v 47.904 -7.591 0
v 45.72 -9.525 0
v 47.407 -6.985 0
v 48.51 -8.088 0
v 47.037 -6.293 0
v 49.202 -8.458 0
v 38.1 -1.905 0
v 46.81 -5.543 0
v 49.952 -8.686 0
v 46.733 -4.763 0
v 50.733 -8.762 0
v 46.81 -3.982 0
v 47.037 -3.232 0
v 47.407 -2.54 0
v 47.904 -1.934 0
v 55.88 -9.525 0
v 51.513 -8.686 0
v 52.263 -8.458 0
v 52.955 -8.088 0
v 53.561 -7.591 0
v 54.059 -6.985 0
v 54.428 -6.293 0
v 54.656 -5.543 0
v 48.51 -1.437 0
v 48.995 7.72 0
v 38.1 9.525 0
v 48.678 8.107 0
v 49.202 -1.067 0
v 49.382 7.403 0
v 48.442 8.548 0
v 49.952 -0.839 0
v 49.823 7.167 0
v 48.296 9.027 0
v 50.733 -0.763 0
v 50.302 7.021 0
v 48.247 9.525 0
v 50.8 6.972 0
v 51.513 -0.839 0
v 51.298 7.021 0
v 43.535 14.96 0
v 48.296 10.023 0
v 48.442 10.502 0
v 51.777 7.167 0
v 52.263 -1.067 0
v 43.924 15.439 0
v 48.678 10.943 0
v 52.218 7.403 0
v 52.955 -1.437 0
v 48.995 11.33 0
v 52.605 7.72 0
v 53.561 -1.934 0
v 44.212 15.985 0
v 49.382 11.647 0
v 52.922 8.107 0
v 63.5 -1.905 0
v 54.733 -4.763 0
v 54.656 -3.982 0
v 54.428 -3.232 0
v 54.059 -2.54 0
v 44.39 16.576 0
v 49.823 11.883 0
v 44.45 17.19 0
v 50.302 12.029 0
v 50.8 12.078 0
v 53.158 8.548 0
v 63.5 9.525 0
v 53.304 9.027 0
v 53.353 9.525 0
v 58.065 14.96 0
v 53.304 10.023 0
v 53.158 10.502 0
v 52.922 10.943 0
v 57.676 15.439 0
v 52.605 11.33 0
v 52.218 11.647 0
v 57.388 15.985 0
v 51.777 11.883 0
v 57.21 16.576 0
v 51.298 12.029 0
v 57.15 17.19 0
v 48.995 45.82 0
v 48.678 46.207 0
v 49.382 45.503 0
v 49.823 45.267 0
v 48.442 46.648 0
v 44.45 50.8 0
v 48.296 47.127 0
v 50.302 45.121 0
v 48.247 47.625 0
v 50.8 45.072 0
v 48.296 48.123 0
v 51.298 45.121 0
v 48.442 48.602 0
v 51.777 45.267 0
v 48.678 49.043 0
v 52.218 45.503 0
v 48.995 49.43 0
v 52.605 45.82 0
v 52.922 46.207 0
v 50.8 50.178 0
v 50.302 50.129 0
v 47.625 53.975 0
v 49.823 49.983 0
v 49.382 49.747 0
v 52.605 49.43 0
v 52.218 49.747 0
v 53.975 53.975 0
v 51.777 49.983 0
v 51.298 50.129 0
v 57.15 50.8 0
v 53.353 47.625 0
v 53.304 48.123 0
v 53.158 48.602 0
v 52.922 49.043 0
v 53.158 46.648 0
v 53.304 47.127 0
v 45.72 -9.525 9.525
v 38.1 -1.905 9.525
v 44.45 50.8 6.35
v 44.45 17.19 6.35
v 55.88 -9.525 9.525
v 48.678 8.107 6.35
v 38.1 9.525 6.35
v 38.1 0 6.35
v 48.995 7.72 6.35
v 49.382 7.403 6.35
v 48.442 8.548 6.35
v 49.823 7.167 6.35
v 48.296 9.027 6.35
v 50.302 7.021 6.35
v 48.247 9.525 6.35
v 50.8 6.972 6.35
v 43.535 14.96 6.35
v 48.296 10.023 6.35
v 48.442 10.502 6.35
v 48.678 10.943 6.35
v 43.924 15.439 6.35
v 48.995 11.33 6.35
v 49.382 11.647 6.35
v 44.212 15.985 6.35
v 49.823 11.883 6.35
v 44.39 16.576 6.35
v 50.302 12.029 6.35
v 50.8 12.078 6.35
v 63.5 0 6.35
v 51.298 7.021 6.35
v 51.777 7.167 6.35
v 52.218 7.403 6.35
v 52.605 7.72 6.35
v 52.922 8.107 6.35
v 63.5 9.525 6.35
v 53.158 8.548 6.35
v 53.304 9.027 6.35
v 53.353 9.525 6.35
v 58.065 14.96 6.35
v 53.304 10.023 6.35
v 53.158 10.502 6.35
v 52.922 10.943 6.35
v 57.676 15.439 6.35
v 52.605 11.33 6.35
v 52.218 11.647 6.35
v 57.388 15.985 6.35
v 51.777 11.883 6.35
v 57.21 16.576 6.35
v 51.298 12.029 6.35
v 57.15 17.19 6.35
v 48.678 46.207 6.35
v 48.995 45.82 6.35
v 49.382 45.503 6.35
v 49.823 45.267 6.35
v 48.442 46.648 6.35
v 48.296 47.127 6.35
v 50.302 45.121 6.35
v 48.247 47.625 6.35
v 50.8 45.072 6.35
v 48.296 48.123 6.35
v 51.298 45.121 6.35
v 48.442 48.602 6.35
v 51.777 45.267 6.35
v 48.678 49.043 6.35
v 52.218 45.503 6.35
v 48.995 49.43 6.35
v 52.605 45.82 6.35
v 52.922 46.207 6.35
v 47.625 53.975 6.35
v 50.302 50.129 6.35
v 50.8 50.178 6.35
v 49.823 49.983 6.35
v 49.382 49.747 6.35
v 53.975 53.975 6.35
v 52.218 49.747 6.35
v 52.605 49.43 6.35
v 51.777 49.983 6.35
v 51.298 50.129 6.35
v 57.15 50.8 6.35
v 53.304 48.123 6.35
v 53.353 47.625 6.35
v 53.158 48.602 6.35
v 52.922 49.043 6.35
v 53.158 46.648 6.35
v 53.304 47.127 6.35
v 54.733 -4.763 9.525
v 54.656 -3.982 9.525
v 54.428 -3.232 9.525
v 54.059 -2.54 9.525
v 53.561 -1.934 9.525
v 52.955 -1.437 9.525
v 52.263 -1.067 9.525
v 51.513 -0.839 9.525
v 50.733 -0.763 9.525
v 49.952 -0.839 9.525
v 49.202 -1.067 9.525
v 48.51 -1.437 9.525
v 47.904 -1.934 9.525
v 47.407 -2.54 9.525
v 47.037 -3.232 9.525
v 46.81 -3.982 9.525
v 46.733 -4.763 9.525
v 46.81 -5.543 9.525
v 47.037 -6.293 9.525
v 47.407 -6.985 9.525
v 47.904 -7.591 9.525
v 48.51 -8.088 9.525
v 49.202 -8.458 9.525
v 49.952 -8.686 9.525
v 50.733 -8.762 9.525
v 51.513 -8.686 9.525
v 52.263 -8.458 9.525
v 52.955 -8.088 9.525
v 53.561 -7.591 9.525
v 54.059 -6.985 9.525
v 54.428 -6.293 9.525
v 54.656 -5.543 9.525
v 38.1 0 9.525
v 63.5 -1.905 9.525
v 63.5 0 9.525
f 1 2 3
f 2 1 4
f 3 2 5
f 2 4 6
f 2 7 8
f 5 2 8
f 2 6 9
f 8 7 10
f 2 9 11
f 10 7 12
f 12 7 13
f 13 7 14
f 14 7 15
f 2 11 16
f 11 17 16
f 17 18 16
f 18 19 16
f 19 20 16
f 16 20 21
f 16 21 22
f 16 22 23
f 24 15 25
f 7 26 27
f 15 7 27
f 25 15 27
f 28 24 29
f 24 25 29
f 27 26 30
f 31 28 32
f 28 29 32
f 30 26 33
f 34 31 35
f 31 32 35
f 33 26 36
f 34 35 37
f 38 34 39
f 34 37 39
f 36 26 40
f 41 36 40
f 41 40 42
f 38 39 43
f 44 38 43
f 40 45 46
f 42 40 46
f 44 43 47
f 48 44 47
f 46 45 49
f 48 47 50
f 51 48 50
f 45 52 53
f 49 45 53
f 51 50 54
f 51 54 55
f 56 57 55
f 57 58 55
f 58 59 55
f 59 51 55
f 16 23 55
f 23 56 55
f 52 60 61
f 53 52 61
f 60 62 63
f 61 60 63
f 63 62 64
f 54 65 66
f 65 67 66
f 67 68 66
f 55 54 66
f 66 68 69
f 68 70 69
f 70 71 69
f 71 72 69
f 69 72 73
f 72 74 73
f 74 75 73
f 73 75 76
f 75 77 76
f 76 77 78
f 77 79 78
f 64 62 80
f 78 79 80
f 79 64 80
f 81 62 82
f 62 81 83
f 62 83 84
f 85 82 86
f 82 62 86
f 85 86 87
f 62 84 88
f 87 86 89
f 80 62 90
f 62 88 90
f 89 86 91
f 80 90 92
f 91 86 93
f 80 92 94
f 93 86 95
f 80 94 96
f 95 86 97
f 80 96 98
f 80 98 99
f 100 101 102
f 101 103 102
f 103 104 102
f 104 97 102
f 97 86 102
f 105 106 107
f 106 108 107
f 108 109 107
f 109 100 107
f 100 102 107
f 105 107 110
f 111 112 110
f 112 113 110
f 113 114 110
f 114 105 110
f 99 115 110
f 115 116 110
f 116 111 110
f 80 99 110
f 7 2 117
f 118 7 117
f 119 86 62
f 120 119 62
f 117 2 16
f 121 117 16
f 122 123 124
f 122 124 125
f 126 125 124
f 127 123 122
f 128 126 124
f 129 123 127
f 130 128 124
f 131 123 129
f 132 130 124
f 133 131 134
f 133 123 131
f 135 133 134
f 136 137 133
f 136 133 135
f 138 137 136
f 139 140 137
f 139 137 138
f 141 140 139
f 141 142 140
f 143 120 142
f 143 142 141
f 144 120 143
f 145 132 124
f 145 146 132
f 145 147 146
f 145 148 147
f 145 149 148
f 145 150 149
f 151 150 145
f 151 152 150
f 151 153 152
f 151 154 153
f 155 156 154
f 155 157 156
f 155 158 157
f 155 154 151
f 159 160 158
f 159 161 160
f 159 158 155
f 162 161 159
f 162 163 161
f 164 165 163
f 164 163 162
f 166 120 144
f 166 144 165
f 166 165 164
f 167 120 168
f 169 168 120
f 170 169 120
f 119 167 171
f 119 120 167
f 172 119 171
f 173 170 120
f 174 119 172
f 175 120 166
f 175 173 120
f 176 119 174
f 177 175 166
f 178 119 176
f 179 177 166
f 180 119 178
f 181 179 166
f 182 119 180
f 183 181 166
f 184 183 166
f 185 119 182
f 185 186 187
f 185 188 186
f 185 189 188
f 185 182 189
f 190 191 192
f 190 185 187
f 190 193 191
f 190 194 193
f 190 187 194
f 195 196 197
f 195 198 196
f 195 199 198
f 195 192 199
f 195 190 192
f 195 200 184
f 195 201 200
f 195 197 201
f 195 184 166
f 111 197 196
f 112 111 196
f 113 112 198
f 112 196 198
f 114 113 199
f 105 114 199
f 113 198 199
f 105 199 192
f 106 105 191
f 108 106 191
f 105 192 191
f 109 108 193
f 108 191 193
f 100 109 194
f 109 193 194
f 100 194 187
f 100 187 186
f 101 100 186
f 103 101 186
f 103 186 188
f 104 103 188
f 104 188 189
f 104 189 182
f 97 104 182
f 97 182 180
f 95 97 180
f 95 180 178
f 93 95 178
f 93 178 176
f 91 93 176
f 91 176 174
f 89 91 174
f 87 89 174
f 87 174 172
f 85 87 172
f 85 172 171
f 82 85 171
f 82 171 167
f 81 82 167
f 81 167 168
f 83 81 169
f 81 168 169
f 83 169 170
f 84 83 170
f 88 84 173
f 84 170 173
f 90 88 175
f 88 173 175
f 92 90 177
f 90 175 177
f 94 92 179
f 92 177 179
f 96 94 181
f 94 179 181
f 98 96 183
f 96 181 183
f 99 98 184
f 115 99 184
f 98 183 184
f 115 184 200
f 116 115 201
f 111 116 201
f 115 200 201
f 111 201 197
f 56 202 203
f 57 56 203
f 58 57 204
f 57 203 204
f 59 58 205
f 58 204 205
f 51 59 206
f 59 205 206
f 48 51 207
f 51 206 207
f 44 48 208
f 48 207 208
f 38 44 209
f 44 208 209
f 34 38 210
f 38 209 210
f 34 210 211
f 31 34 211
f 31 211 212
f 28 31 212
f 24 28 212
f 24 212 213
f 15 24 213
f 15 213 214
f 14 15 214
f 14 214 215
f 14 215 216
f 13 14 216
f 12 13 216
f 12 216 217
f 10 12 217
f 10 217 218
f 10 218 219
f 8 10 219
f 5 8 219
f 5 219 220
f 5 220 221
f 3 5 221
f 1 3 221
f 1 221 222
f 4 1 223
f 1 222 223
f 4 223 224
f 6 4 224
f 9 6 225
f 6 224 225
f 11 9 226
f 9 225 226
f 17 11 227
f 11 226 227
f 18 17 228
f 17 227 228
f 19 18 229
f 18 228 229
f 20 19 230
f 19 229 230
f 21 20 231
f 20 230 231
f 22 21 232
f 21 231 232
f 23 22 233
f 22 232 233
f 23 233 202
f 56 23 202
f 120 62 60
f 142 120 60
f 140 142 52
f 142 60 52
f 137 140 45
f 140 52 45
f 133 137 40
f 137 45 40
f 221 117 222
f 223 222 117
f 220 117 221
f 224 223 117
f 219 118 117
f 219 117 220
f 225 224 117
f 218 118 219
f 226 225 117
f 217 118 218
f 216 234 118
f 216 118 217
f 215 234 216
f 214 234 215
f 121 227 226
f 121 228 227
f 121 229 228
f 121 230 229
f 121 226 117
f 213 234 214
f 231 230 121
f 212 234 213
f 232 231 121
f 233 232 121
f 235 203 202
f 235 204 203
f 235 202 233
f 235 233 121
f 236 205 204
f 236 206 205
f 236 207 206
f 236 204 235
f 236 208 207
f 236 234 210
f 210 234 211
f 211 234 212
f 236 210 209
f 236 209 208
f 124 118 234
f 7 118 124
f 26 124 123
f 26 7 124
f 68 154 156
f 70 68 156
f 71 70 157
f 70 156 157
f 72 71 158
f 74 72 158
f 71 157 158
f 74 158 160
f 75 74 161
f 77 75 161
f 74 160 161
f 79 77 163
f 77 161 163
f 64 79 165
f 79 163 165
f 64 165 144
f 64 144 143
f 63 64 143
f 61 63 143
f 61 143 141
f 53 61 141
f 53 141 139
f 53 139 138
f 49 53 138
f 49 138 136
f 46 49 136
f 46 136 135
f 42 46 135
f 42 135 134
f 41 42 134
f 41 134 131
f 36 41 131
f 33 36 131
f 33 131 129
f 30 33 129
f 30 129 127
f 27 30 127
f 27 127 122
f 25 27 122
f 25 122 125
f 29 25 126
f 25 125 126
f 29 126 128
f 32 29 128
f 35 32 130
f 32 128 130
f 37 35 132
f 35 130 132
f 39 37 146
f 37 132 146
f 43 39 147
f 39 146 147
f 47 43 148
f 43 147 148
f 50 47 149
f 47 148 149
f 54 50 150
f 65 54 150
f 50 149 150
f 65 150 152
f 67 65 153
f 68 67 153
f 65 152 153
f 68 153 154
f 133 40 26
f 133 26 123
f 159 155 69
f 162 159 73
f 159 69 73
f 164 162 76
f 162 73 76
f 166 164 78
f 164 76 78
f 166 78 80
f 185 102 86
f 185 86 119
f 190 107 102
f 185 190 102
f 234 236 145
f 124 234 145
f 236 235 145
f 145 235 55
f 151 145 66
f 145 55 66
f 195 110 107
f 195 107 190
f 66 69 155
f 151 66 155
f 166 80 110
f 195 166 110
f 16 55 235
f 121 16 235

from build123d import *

# Parameters (mm, degrees)
SKETCH1_W                   = 25.4
SKETCH1_H                   = 66.675
BOSS_EXTRUDE1_DEPTH         = 9.525
TAP_DRILL_FOR_1_4_20_TAP1_D = 5.1054
SKETCH4_W                   = 3.175
SKETCH4_H                   = 57.15
CUT_EXTRUDE1_DEPTH          = 64.261426833
F_8_0_8_DIAMETER_HOLE1_D    = 8
CHAMFER1_SIZE               = 7.62
CUT_EXTRUDE2_DEPTH          = 86.959863454
CHAMFER2_SIZE               = 6.35
FILLET1_DEPTH               = 6.35
CHAMFER3_SIZE               = 3.175


with BuildPart() as part:
    # Sketch1 → Boss-Extrude1 (new body)
    with BuildSketch(Plane.XY):
        with Locations((50.8, 23.8125)):
            Rectangle(SKETCH1_W, SKETCH1_H)
    extrude(amount=BOSS_EXTRUDE1_DEPTH)

    # Tap Drill for 1/4-20 Tap1 (through all)
    with Locations(Plane(origin=(0, 0, 0), x_dir=(-1, 0, 0), z_dir=(0, 0, -1))):
        with Locations((-50.8, 47.625), (-50.8, 9.525)):
            Hole(TAP_DRILL_FOR_1_4_20_TAP1_D / 2)

    # Sketch4 → Cut-Extrude1 (cut, through all)
    with BuildSketch(Plane(origin=(63.5, 0, 0), x_dir=(0, 0, -1), z_dir=(1, 0, 0))):
        with Locations((-7.9375, 28.575)):
            Rectangle(SKETCH4_W, SKETCH4_H)
    extrude(amount=-CUT_EXTRUDE1_DEPTH, mode=Mode.SUBTRACT)

    # Ø8.0 (8) Diameter Hole1 (through all)
    with Locations(Plane(origin=(0, 0, 0), x_dir=(-1, 0, 0), z_dir=(0, 0, -1))):
        with Locations((-50.732643015, -4.7625)):
            Hole(F_8_0_8_DIAMETER_HOLE1_D / 2)

    # Chamfer1
    chamfer1_edges = [part.edges().sort_by_distance(p)[0] for p in [
        (63.5, -9.525, 4.7625),
        (38.1, -9.525, 4.7625),
    ]]
    chamfer(chamfer1_edges, length=CHAMFER1_SIZE)

    # Sketch7 → Cut-Extrude2 (cut, through all)
    with BuildSketch(Plane(origin=(0, 0, 0), x_dir=(-1, 0, 0), z_dir=(0, 0, -1))):
        Polygon((-44.45, 15.875), (-21.210032305, 15.875), (-21.210032305, 64.752426372), (-78.308679705, 64.752426372), (-78.308679705, 15.875), (-57.15, 15.875), (-57.15, 53.975), (-44.45, 53.975), align=None)
    extrude(amount=-CUT_EXTRUDE2_DEPTH, mode=Mode.SUBTRACT)

    # Chamfer2
    chamfer2_edges = [part.edges().sort_by_distance(p)[0] for p in [
        (38.1, 15.875, 3.175),
        (63.5, 15.875, 3.175),
    ]]
    chamfer(chamfer2_edges, length=CHAMFER2_SIZE - 0.0001)  # a hair under: the kernel refuses the full size

    # Fillet1: read off the stored shape, not the designer's step
    # Fillet1 outline → Fillet1 (add)
    with BuildSketch(Plane.XY):
        with BuildLine():
            ThreePointArc((44.45, 17.190128061), (44.208317516, 15.975108163), (43.52006403, 14.94506403))
            Line((43.52006403, 14.94506403), (44.45, 15.875))
            Line((44.45, 15.875), (44.45, 17.190128061))
        make_face()
        with BuildLine():
            ThreePointArc((58.07993597, 14.94506403), (57.391682484, 15.975108163), (57.15, 17.190128061))
            Line((57.15, 17.190128061), (57.15, 15.875))
            Line((57.15, 15.875), (58.07993597, 14.94506403))
        make_face()
    extrude(amount=FILLET1_DEPTH)

    # Chamfer3
    chamfer3_edges = [part.edges().sort_by_distance(p)[0] for p in [
        (57.15, 53.975, 3.175),
        (44.45, 53.975, 3.175),
    ]]
    chamfer(chamfer3_edges, length=CHAMFER3_SIZE)


solid = part.part
